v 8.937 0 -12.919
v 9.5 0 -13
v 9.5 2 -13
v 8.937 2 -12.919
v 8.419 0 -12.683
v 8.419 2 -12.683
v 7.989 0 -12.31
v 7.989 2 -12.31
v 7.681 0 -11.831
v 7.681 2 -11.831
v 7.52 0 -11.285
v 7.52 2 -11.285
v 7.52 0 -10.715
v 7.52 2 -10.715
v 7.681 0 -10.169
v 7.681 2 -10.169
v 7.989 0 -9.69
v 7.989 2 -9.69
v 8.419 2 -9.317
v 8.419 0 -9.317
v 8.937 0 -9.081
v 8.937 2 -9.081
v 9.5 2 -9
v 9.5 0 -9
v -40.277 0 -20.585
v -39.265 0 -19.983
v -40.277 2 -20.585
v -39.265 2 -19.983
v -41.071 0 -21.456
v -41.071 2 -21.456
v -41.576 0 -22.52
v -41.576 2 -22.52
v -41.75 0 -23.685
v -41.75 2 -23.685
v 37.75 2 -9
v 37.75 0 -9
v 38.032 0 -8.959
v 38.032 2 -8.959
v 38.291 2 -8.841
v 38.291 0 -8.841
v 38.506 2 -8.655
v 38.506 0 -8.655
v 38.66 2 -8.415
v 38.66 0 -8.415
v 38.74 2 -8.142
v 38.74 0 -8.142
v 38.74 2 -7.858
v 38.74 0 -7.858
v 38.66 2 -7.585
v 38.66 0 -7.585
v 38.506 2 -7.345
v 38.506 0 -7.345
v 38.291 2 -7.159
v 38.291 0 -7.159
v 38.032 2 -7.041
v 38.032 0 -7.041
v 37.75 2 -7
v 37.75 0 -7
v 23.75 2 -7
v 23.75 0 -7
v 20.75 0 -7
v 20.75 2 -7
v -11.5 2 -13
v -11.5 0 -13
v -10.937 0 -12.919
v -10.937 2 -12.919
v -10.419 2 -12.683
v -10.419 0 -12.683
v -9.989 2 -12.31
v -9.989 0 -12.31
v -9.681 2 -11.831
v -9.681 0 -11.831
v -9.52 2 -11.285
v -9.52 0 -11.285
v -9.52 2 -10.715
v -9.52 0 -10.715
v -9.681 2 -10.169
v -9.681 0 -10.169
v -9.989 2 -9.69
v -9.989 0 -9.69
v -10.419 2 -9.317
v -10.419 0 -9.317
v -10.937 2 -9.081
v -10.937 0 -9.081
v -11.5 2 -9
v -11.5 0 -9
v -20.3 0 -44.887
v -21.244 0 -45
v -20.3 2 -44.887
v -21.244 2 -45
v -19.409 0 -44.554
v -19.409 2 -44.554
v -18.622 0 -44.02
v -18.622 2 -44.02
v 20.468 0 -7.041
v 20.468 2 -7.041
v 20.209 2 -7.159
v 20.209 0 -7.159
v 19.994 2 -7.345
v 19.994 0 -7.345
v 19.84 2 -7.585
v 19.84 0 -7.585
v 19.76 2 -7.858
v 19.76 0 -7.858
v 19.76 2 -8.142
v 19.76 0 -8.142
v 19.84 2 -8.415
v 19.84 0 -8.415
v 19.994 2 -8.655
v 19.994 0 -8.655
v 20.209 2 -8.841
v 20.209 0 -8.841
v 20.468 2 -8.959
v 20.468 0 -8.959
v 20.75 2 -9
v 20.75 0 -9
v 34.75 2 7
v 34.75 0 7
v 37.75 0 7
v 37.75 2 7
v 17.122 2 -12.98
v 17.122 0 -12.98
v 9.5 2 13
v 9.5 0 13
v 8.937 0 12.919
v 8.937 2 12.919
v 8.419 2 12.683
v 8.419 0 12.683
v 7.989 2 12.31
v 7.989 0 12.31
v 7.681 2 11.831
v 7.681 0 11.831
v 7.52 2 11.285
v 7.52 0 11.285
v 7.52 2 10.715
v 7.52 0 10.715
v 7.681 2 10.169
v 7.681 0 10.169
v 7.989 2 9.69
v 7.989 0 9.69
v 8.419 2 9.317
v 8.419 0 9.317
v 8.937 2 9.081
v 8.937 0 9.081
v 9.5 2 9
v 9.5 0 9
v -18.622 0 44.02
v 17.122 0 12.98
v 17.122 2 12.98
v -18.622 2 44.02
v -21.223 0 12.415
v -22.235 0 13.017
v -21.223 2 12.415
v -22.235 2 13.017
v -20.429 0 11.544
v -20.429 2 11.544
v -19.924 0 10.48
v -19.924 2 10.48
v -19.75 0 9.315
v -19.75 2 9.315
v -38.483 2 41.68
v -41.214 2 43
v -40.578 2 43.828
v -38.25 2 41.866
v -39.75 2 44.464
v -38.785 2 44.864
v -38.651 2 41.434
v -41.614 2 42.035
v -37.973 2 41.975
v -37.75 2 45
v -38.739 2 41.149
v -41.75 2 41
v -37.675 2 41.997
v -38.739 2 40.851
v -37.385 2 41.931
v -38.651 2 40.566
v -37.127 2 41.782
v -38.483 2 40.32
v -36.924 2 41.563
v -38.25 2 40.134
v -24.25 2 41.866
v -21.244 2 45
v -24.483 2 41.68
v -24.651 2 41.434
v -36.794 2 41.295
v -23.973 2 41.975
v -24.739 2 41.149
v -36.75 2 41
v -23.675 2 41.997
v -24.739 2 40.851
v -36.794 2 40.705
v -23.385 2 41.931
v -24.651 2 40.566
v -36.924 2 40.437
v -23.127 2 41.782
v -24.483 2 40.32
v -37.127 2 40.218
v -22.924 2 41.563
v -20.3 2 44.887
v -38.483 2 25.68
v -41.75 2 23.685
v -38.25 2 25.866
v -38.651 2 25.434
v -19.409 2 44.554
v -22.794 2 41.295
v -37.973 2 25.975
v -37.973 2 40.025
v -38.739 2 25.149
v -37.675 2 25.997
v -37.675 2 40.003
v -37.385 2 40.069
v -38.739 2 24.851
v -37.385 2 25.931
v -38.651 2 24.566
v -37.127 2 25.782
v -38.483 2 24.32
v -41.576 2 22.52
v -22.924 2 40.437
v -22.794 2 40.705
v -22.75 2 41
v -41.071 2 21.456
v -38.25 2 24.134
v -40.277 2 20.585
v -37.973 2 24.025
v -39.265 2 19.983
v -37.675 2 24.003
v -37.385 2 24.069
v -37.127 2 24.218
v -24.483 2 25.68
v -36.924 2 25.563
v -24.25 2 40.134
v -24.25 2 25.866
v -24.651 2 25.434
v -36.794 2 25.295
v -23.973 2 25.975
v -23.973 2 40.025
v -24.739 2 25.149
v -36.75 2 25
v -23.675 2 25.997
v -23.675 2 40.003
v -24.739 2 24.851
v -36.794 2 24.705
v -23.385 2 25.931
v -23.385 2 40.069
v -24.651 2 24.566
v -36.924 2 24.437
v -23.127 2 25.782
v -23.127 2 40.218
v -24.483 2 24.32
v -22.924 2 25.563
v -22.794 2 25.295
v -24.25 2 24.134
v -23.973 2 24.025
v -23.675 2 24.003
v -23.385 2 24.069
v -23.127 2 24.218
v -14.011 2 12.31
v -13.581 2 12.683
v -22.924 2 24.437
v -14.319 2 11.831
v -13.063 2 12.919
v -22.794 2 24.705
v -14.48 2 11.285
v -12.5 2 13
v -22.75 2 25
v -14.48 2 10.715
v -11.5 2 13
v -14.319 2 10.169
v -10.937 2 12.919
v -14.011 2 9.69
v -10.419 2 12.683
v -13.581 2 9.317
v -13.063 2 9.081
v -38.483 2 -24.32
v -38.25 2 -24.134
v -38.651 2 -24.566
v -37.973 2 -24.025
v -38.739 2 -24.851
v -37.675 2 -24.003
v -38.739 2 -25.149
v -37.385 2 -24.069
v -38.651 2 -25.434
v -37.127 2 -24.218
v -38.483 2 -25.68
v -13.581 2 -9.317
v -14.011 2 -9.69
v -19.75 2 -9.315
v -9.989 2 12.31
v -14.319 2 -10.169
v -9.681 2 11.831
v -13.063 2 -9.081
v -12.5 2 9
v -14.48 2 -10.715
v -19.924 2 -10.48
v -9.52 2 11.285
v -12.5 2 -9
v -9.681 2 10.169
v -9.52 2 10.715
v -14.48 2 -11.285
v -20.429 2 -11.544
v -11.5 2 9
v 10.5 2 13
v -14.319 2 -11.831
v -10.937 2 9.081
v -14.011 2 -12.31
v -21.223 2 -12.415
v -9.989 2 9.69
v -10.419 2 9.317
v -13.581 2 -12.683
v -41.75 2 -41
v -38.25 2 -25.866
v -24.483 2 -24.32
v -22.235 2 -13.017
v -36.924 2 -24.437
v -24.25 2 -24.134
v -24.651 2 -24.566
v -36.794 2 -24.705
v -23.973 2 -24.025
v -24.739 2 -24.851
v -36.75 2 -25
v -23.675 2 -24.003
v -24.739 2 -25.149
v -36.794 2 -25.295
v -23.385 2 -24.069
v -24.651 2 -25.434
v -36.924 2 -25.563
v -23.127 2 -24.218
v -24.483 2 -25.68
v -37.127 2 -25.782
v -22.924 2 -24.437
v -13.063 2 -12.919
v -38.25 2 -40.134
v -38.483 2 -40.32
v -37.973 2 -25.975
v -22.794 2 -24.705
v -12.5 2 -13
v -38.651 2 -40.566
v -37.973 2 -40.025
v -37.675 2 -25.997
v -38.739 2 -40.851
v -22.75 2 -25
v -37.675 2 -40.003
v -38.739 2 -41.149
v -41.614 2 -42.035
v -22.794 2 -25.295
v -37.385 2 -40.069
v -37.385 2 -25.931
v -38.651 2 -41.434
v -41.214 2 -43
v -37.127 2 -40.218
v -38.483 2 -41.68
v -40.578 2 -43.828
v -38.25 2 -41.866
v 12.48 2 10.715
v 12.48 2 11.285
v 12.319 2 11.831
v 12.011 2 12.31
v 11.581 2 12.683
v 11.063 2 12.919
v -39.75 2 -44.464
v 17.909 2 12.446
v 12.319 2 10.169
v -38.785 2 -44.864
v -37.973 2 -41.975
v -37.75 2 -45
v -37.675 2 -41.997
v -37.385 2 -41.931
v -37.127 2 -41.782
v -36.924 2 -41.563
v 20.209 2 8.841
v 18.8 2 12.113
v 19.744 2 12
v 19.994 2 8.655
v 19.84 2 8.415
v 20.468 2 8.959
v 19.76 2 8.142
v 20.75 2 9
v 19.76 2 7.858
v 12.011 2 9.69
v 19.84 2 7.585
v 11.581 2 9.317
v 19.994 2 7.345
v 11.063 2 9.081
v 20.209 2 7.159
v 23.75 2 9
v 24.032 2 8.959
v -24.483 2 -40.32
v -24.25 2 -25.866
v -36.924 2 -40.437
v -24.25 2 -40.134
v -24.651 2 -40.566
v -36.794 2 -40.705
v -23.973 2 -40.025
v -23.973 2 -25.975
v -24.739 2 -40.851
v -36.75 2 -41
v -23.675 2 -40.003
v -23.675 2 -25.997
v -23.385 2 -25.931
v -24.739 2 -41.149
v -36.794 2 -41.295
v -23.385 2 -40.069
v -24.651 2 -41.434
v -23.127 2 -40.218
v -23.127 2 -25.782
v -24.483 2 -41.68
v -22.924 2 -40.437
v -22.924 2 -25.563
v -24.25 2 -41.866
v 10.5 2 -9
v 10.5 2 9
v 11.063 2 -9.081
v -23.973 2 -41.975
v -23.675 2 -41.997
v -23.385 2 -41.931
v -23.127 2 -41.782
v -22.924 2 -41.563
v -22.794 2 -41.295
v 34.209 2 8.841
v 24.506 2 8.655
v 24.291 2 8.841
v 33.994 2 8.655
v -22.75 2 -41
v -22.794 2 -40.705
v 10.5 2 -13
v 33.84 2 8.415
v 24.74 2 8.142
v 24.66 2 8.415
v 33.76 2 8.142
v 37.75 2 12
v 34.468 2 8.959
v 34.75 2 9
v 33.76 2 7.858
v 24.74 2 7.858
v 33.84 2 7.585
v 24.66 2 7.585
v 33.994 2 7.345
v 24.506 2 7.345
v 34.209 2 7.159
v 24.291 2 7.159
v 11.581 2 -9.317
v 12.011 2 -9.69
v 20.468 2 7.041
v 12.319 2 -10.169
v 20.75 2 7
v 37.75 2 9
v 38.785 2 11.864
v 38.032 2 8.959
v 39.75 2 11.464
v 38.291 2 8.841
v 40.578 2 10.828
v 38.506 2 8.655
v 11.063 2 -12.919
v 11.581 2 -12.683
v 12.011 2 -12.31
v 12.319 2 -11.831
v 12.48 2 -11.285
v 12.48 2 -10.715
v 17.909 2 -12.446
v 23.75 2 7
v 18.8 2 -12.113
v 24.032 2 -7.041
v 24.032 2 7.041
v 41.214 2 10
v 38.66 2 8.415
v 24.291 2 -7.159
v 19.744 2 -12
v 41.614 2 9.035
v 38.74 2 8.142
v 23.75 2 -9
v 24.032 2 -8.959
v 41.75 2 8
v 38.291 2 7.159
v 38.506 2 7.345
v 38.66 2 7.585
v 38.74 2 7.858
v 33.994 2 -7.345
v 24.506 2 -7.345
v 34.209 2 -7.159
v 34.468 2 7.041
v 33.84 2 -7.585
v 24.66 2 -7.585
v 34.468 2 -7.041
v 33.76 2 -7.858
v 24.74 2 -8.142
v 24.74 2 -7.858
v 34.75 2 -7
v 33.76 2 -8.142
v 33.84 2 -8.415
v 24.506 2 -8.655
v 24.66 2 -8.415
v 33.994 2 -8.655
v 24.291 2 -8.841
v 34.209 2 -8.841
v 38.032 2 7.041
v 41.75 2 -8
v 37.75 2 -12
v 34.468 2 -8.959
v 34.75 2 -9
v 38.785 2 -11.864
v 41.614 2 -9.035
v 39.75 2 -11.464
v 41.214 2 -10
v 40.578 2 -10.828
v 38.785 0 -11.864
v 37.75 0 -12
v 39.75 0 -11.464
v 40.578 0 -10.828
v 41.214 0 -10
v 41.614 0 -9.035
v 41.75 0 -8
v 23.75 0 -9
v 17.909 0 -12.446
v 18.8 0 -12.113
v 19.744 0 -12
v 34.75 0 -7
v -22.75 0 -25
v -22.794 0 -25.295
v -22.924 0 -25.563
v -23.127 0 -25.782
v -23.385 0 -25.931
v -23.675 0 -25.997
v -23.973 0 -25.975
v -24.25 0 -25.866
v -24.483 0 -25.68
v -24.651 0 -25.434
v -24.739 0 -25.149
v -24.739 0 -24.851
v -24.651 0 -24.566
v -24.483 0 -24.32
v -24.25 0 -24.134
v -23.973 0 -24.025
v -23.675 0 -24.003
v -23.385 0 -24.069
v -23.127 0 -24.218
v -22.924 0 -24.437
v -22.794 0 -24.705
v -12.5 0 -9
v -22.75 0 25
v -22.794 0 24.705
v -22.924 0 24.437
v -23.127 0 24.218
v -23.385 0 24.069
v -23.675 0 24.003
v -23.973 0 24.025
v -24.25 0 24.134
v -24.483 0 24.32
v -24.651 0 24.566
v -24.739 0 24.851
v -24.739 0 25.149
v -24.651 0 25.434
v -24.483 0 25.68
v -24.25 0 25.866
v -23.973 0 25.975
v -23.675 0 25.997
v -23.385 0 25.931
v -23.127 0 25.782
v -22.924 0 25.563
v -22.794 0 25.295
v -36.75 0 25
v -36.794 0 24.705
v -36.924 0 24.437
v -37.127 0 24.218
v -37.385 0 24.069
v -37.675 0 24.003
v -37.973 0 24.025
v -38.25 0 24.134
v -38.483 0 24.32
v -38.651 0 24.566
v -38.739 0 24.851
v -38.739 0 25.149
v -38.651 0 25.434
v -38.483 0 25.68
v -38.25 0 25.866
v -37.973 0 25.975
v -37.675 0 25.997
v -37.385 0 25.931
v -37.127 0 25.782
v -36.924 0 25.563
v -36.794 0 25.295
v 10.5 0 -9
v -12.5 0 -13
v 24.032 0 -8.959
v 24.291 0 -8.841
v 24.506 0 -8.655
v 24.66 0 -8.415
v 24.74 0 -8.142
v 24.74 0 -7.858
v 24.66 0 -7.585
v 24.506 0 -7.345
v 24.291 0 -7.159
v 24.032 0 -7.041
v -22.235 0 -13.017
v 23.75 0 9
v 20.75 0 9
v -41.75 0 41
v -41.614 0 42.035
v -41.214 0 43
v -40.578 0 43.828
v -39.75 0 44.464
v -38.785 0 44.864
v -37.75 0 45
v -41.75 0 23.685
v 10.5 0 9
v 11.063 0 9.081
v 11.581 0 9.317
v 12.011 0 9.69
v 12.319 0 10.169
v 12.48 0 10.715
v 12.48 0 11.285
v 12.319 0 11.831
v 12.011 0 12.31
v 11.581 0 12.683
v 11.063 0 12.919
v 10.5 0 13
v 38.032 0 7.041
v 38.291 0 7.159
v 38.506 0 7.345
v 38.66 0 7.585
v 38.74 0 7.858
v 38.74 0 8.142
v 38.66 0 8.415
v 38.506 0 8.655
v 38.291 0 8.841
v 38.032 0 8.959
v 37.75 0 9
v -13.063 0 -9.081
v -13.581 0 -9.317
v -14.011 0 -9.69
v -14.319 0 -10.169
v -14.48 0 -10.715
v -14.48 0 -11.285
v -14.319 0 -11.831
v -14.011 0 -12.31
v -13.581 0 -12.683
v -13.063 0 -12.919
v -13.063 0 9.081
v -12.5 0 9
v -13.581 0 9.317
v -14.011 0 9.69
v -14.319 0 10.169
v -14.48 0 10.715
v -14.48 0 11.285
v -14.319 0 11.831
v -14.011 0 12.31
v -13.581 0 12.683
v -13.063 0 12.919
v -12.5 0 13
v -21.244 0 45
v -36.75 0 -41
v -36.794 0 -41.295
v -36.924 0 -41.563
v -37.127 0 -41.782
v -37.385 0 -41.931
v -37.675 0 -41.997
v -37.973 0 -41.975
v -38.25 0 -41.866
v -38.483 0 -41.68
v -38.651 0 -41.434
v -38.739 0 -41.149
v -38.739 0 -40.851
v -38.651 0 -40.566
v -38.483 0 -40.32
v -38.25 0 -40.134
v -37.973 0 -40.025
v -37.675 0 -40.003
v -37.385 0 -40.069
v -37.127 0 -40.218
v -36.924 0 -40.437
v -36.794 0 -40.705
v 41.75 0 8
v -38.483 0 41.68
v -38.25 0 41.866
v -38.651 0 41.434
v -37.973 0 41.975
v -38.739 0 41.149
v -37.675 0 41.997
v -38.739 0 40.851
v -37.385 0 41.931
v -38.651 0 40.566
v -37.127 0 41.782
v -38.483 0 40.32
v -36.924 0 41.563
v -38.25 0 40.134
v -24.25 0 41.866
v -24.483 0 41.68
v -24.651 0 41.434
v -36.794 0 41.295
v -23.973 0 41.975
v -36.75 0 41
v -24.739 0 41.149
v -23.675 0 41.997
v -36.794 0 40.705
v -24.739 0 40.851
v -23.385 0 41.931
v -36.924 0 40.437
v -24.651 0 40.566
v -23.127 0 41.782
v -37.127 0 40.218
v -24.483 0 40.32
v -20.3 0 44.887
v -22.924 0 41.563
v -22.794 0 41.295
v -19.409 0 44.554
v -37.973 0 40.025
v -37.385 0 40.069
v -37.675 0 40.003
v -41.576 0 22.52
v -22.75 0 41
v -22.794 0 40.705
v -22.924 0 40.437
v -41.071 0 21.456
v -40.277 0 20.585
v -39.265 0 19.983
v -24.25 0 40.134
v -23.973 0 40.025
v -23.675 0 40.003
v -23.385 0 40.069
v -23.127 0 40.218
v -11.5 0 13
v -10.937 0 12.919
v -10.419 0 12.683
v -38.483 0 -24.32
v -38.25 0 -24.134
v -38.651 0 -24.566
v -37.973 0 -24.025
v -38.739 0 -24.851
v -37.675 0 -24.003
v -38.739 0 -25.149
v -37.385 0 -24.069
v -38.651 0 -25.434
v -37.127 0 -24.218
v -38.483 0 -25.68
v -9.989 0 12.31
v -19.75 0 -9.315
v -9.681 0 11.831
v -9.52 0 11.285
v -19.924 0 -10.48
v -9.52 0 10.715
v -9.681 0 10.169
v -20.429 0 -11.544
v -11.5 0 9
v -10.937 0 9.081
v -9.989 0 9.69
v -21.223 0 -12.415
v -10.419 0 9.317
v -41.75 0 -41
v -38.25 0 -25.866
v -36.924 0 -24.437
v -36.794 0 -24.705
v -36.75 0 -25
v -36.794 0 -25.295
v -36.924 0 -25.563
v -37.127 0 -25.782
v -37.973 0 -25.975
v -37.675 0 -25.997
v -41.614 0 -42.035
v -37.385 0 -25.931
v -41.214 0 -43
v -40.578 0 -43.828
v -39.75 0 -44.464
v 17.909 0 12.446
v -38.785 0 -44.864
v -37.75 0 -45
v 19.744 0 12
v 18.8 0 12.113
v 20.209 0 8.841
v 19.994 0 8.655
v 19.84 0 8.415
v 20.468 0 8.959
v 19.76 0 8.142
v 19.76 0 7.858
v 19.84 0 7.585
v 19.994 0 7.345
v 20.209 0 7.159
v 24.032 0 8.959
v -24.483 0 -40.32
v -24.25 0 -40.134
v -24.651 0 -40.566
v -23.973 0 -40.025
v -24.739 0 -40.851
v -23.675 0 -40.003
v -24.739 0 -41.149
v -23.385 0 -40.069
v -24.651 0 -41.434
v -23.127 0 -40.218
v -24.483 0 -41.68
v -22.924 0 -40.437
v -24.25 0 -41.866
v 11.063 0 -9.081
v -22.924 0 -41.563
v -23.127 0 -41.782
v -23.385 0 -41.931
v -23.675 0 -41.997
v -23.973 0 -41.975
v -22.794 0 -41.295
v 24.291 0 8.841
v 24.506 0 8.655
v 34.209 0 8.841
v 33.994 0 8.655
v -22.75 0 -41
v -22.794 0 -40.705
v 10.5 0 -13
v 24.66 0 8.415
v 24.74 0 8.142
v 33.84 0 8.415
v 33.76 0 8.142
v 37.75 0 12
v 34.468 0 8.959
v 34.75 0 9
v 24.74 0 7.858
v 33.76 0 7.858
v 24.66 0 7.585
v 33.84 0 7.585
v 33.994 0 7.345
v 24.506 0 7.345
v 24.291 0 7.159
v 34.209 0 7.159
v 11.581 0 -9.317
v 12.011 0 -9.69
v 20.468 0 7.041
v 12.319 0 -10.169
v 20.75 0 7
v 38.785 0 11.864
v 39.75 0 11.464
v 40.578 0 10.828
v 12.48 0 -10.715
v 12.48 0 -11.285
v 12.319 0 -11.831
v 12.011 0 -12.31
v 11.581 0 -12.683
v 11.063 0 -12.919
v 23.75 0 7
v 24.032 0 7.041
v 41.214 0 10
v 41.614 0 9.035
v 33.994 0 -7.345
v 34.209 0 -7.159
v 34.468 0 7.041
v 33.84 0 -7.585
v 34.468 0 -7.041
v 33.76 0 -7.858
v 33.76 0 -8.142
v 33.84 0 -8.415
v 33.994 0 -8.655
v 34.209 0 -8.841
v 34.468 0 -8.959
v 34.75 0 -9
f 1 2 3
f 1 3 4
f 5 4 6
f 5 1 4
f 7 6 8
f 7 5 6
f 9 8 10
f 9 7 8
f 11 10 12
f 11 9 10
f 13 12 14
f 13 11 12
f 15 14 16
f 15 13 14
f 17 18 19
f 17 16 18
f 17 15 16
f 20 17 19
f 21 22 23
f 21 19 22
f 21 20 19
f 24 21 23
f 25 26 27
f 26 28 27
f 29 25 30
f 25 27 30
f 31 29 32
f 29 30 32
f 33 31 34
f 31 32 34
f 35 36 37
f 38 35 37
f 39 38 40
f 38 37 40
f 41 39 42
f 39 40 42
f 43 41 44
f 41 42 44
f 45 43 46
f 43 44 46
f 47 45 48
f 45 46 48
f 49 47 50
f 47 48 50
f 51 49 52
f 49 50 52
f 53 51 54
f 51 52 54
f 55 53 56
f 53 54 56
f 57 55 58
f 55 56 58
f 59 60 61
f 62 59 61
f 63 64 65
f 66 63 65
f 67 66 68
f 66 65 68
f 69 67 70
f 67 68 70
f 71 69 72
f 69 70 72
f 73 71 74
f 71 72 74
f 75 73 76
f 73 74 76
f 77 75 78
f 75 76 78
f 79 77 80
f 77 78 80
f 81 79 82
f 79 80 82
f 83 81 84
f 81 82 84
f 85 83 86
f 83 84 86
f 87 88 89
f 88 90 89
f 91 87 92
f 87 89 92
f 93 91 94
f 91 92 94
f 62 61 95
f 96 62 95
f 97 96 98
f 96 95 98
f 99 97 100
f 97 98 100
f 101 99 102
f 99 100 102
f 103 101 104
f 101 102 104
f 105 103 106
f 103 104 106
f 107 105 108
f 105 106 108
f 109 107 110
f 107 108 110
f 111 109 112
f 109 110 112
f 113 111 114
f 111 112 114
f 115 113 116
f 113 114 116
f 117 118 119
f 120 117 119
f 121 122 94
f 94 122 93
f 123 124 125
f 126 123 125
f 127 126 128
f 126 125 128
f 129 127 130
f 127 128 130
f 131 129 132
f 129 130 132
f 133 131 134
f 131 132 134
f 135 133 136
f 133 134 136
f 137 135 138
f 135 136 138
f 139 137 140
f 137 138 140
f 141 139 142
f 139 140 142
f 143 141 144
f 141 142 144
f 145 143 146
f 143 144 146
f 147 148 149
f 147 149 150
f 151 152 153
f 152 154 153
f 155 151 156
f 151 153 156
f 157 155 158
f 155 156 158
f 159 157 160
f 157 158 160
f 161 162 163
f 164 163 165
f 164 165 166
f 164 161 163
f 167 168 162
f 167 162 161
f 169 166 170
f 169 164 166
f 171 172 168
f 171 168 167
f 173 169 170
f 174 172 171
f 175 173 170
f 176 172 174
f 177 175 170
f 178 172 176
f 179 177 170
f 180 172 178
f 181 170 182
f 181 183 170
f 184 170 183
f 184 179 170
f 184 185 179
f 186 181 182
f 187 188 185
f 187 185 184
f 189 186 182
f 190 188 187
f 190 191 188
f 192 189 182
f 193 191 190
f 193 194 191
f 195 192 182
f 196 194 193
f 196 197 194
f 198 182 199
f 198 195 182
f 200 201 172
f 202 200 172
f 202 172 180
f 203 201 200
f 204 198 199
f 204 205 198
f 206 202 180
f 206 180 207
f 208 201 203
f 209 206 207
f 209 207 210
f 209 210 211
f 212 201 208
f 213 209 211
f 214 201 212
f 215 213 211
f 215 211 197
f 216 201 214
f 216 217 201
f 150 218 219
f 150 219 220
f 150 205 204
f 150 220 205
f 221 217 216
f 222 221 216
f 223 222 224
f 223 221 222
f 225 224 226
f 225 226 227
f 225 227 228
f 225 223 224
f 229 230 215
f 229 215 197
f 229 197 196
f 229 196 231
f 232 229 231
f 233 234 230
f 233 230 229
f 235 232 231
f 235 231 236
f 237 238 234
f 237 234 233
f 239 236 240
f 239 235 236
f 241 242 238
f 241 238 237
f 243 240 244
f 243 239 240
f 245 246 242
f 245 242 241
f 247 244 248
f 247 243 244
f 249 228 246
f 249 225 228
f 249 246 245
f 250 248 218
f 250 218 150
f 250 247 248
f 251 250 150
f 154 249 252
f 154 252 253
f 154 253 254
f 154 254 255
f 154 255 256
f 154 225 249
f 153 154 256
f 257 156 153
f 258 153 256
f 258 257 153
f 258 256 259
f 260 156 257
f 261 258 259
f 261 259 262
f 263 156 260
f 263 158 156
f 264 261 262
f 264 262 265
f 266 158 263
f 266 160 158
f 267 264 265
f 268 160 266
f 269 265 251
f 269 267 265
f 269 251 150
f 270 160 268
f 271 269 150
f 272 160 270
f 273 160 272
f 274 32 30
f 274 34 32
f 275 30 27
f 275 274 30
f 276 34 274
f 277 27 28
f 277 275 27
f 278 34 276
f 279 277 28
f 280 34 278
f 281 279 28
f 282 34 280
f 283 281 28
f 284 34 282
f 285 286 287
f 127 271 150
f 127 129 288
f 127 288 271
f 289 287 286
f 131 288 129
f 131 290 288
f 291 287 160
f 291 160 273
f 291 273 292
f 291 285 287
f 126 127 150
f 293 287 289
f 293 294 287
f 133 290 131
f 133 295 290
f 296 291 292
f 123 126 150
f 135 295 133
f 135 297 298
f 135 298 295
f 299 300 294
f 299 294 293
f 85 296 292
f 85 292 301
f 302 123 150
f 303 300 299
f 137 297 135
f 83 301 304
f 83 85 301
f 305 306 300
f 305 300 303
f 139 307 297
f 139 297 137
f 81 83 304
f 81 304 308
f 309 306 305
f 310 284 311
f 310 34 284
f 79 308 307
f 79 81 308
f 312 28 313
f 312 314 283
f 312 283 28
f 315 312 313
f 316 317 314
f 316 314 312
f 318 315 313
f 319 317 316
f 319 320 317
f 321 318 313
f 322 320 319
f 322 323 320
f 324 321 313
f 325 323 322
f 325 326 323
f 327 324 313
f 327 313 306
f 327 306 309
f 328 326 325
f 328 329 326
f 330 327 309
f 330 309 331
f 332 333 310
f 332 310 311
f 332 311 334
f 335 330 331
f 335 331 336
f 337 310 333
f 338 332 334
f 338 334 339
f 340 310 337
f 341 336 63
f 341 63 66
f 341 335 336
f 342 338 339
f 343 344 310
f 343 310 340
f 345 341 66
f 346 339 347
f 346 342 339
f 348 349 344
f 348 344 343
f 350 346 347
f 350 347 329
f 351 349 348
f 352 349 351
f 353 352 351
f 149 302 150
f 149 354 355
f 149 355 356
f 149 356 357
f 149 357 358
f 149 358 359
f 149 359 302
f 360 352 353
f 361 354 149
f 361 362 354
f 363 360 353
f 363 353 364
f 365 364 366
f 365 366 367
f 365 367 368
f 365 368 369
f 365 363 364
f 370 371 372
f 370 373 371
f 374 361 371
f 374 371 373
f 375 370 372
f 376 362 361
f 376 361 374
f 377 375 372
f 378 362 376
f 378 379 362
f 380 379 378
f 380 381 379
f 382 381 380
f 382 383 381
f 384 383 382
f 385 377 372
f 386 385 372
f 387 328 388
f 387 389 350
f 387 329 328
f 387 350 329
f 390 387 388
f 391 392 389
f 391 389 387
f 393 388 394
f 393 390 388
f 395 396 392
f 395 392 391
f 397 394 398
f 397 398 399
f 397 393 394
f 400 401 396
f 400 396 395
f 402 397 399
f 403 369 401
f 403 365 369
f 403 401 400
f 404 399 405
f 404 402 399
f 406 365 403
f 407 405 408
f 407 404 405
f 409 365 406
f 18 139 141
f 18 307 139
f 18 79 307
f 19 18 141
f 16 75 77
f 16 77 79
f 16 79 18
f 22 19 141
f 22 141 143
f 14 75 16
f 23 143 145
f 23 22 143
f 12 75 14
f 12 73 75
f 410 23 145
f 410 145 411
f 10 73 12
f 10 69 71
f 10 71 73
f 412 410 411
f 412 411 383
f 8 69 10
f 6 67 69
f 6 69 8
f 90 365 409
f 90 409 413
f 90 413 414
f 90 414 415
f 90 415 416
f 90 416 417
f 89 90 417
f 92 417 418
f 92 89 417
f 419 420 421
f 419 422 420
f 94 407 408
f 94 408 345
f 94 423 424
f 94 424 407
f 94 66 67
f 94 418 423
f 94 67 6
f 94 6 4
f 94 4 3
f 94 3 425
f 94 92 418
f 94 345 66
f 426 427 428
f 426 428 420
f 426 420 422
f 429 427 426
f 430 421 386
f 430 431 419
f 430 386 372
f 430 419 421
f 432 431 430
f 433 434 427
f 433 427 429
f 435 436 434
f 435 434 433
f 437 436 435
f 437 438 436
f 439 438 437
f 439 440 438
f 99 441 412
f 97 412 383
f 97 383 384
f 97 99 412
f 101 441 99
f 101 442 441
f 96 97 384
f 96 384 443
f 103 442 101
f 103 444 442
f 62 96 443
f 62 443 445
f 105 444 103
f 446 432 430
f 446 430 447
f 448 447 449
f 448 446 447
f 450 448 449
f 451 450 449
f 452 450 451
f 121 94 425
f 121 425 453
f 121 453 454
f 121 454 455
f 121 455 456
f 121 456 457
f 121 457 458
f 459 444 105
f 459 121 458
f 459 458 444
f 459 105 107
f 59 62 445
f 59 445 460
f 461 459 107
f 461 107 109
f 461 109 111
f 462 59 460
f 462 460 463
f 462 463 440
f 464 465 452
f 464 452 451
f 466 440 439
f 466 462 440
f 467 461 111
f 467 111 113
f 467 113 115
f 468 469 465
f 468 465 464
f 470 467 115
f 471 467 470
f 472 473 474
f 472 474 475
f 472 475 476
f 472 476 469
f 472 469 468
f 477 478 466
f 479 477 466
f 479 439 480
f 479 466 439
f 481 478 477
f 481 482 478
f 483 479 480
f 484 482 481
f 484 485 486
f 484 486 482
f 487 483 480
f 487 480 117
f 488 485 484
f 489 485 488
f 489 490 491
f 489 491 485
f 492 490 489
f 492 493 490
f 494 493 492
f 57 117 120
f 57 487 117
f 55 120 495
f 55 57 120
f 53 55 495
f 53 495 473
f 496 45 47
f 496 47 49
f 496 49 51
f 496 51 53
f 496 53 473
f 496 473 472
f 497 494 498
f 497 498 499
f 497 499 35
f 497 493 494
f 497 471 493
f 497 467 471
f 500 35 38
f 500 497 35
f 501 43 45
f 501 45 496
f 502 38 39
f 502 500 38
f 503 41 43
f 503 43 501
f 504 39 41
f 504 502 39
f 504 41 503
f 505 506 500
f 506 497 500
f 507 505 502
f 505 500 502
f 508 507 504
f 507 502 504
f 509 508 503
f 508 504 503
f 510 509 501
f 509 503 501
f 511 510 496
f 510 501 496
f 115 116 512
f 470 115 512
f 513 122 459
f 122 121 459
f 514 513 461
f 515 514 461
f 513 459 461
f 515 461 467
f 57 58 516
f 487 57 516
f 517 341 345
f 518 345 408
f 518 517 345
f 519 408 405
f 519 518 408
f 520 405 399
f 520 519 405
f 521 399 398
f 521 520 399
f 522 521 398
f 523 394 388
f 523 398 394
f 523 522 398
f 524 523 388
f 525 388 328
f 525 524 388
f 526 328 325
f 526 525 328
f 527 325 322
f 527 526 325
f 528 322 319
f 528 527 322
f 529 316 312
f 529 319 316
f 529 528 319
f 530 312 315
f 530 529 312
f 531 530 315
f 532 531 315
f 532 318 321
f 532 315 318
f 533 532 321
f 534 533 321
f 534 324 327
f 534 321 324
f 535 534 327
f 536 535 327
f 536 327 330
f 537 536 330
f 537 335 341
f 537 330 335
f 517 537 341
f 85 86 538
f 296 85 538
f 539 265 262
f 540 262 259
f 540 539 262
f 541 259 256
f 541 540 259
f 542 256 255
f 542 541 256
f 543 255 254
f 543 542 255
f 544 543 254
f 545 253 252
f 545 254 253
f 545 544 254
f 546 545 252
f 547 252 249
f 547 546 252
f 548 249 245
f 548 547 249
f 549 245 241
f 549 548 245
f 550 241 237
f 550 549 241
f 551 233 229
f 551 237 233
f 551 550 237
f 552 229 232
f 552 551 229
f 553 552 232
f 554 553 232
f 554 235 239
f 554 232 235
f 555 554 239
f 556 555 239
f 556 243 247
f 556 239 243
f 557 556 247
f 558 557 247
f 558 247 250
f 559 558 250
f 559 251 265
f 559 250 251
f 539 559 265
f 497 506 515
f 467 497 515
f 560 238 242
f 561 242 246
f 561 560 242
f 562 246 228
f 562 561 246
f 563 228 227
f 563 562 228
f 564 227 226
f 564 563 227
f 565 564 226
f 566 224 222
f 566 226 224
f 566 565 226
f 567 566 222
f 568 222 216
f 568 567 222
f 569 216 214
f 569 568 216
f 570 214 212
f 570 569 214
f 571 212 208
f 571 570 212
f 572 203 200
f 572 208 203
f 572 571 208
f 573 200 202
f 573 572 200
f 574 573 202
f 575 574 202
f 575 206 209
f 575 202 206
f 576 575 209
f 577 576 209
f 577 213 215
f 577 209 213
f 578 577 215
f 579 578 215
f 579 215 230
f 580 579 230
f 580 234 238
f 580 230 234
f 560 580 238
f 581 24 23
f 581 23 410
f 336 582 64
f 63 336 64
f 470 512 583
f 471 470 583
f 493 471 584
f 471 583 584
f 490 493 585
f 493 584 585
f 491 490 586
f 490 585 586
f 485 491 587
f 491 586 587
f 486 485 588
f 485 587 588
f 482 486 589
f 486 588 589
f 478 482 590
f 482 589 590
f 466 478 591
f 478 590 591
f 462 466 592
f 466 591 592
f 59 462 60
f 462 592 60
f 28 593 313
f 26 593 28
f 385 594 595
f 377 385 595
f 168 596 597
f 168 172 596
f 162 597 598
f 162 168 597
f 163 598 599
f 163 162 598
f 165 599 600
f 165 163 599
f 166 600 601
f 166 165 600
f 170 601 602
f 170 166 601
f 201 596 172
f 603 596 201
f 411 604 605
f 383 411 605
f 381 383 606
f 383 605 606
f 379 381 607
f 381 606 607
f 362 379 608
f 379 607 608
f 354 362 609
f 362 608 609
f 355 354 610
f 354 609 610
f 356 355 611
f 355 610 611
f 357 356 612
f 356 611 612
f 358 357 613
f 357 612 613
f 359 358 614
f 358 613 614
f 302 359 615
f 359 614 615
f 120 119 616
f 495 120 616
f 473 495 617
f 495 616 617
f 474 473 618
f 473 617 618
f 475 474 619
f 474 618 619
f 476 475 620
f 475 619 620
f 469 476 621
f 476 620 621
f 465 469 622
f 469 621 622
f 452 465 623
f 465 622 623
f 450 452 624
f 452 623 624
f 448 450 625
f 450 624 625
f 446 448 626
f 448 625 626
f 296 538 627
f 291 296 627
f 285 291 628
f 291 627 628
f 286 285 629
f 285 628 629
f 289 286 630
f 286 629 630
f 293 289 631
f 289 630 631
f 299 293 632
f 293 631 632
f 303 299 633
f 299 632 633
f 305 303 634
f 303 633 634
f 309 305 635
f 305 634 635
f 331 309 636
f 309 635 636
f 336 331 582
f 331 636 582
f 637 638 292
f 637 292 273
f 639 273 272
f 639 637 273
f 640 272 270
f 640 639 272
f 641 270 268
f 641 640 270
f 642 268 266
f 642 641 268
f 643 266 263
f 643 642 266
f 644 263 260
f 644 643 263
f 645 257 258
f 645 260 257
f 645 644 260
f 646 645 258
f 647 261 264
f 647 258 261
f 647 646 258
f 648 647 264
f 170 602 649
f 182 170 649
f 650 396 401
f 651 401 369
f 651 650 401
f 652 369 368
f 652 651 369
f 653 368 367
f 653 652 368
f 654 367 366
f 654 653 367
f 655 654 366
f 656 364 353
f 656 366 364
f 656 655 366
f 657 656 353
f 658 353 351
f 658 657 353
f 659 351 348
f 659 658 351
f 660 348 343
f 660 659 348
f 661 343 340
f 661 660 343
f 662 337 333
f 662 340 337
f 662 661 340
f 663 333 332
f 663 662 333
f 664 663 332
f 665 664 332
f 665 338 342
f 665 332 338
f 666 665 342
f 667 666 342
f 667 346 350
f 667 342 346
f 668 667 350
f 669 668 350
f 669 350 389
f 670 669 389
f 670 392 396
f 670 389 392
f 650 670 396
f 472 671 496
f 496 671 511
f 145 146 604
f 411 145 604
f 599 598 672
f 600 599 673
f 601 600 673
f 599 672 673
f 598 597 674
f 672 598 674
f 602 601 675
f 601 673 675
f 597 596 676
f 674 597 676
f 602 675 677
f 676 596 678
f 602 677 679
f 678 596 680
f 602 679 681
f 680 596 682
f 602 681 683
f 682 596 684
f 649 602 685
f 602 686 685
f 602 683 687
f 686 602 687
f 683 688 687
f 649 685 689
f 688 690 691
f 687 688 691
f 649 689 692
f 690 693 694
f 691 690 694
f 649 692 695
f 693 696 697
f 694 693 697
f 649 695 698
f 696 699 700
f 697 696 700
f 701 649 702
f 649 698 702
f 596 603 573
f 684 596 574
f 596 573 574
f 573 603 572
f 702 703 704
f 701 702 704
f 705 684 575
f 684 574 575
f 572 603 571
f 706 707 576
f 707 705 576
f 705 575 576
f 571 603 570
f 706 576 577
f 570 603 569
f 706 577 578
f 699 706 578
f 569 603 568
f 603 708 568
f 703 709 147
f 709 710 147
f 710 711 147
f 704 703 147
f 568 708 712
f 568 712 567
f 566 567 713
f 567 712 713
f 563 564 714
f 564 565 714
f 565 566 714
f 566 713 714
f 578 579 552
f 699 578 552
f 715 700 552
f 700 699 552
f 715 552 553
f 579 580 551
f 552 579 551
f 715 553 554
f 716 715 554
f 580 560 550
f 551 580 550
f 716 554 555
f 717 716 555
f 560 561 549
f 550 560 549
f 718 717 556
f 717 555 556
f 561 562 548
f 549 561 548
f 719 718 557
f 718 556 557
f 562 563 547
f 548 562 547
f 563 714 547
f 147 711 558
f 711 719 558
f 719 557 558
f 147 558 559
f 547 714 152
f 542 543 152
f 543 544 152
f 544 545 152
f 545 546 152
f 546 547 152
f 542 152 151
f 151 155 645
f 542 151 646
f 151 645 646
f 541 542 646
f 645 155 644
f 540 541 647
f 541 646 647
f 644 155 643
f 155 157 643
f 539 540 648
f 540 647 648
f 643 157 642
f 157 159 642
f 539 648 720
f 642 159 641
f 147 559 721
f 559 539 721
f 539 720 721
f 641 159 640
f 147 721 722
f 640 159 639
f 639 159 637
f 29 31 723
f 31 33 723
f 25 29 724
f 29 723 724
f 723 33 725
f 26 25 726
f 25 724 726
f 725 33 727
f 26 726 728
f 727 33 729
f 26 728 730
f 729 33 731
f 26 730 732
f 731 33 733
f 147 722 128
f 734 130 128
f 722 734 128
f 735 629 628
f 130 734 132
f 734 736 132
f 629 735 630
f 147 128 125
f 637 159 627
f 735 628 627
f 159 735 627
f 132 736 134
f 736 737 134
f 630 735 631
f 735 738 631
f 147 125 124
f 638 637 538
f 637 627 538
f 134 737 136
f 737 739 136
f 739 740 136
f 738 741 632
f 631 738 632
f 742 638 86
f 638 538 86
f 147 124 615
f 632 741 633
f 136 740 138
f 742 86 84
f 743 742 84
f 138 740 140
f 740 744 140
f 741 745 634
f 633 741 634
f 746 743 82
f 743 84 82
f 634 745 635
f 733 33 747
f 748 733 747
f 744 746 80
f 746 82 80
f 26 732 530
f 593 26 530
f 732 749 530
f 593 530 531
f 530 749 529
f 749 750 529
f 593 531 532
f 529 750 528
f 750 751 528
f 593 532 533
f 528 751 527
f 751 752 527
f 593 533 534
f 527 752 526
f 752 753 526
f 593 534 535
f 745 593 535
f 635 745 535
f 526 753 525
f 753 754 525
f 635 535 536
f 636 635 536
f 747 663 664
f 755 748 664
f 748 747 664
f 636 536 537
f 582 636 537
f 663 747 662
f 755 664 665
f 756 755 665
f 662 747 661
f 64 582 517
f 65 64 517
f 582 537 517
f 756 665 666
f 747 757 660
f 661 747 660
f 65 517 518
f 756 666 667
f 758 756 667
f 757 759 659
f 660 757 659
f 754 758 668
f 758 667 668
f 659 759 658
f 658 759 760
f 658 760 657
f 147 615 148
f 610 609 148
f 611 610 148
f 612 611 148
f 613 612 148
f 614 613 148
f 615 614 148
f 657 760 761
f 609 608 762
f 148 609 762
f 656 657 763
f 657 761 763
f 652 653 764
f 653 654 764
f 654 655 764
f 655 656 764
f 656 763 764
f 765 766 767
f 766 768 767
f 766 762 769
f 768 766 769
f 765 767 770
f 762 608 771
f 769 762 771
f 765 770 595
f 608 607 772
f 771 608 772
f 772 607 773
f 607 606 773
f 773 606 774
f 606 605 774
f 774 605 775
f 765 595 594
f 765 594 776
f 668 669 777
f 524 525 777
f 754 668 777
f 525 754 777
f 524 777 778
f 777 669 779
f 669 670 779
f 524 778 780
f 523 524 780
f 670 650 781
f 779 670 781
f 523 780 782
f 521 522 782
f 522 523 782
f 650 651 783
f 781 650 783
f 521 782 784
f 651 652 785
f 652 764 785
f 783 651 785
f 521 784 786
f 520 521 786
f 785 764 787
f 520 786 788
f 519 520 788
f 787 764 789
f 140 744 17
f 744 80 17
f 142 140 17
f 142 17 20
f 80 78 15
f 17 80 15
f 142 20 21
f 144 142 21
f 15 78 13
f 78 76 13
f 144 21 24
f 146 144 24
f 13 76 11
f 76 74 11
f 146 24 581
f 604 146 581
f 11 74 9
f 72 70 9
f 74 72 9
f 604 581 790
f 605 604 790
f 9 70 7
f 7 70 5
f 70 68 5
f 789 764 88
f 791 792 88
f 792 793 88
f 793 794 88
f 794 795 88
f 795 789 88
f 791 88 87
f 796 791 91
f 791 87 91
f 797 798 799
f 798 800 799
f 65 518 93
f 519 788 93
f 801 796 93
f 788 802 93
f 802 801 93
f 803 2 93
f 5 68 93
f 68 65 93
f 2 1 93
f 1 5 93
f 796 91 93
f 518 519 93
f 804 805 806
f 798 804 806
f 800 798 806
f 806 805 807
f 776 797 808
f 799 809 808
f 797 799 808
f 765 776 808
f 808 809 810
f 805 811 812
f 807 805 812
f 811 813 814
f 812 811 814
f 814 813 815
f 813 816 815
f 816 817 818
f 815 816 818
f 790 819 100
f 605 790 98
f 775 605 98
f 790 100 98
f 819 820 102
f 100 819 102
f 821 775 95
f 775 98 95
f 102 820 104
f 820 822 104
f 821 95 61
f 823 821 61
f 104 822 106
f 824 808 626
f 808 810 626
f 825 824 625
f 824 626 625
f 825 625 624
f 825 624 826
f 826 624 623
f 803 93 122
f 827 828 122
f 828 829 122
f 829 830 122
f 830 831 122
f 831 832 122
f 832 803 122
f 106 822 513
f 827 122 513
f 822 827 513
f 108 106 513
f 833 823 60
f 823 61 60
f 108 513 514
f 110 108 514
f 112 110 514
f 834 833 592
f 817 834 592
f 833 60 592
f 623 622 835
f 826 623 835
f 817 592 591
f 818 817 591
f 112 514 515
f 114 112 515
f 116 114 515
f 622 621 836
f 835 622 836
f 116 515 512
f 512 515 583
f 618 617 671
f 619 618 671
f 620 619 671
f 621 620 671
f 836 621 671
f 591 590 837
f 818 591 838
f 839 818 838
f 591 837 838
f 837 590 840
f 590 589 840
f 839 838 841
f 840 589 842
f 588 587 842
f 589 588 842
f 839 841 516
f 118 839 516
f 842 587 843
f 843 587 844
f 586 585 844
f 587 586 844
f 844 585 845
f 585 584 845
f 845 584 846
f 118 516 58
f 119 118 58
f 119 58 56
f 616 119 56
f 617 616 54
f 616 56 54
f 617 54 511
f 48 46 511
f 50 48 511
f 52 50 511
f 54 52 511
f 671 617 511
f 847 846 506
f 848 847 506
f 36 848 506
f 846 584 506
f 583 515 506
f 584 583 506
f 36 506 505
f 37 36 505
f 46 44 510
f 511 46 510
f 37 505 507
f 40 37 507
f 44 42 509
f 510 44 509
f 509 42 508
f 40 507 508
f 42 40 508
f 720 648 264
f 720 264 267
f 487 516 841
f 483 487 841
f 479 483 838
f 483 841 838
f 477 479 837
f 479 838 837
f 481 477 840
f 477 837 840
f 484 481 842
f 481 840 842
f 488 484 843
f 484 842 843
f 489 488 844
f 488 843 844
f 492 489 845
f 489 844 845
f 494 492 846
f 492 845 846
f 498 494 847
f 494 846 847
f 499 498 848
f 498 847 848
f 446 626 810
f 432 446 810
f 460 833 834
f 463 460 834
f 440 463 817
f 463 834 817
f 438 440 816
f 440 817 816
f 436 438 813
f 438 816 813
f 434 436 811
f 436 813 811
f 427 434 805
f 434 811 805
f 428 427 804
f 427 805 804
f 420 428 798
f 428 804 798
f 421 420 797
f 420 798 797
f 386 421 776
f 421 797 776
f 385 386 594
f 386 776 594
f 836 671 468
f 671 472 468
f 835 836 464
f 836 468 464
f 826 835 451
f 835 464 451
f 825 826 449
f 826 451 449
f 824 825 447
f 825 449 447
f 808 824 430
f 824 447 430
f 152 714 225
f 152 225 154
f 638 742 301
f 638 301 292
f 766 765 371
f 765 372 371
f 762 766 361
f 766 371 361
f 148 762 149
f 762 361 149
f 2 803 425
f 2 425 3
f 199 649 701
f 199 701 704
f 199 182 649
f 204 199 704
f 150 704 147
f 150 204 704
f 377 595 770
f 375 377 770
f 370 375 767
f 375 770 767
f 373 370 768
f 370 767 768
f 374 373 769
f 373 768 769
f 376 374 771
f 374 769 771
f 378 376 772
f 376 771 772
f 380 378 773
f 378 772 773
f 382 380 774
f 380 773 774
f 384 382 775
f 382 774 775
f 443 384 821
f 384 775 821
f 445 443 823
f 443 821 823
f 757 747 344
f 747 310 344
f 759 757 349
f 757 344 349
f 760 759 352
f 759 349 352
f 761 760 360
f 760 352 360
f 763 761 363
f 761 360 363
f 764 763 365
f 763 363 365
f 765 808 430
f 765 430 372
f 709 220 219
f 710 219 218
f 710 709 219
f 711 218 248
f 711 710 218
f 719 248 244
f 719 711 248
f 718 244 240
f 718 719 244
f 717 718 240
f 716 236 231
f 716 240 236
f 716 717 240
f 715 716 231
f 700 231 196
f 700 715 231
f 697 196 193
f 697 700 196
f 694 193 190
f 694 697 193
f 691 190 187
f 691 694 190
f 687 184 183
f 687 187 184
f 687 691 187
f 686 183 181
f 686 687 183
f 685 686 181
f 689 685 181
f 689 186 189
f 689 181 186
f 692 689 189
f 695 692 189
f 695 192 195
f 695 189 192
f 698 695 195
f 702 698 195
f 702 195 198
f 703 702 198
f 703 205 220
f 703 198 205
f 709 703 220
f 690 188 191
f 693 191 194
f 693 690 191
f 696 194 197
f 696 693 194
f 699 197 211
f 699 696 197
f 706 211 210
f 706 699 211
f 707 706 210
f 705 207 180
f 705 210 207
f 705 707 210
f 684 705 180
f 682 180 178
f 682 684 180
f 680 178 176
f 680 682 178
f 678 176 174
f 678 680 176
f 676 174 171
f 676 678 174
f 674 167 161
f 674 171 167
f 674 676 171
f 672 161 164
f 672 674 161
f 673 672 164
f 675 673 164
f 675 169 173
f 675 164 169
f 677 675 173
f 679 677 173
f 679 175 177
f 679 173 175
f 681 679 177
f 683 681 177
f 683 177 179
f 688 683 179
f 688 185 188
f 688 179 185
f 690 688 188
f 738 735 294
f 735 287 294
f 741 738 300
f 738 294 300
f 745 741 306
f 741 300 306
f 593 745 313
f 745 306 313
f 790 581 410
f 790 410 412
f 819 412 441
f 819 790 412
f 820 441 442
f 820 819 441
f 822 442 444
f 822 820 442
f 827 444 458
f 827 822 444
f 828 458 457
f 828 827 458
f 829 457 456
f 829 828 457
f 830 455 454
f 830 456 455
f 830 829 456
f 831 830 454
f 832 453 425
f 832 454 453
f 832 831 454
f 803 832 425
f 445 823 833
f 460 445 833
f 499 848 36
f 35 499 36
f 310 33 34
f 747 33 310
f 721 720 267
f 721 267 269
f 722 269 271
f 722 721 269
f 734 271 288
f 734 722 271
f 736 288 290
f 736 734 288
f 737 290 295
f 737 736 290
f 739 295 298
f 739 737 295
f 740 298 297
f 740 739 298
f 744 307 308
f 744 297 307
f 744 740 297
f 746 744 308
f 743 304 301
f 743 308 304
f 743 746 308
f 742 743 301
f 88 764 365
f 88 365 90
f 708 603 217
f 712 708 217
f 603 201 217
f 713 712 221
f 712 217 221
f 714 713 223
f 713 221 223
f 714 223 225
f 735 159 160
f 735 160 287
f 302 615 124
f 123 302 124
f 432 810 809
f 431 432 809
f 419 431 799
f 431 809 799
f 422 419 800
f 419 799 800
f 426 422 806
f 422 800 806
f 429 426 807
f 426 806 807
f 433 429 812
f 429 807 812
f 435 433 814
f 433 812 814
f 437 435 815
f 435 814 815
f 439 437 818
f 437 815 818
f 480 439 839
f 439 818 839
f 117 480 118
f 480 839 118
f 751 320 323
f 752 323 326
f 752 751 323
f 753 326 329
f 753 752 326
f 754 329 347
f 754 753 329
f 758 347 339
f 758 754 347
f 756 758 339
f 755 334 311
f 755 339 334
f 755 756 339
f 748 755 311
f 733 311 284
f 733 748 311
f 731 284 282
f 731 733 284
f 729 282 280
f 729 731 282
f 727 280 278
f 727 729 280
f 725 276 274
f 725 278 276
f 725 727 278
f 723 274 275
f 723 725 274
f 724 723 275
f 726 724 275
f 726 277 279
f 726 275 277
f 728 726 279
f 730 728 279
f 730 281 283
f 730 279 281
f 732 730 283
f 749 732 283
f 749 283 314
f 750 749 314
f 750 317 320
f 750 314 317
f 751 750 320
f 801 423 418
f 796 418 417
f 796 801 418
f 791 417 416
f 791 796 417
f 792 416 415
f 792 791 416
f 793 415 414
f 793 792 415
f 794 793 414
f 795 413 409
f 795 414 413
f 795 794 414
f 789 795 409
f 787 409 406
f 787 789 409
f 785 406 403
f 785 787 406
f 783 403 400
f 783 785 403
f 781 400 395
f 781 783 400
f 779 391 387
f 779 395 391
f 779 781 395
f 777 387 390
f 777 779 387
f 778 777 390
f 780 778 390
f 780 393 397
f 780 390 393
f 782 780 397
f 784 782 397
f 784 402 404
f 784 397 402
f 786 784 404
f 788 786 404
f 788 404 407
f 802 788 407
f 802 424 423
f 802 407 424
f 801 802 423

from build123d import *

# Parameters (mm, degrees)
ESQUISSE1_W             = 83.5
ESQUISSE1_H             = 90
BOSS_EXTRU_1_DEPTH      = 2
ESQUISSE2_R             = 1
ENL_V_MAT_EXTRU_1_DEPTH = 3
CONG_1_R                = 4
ENL_V_MAT_EXTRU_2_DEPTH = 3


with BuildPart() as part:
    # Esquisse1 → Boss.-Extru.1 (new body)
    with BuildSketch(Plane(origin=(0, 0, 0), x_dir=(1, 0, 0), z_dir=(0, 1, 0))):
        Rectangle(ESQUISSE1_W, ESQUISSE1_H)
    extrude(amount=BOSS_EXTRU_1_DEPTH)

    # Esquisse2 → Enlèv. mat.-Extru.1 (cut, through all)
    with BuildSketch(Plane(origin=(0, 0, 0), x_dir=(1, 0, 0), z_dir=(0, 1, 0))):
        with Locations((-23.75, -25)):
            Circle(ESQUISSE2_R)
        with Locations((-37.75, -25)):
            Circle(ESQUISSE2_R)
        with Locations((-37.75, -41)):
            Circle(ESQUISSE2_R)
        with Locations((-23.75, -41)):
            Circle(ESQUISSE2_R)
        with Locations((-23.75, 41)):
            Circle(ESQUISSE2_R)
        with Locations((-37.75, 41)):
            Circle(ESQUISSE2_R)
        with Locations((-37.75, 25)):
            Circle(ESQUISSE2_R)
        with Locations((-23.75, 25)):
            Circle(ESQUISSE2_R)
        Polygon((41.75, 12), (18.25, 12), (-19.75, 45), (41.75, 45), align=None)
        Polygon((41.75, -12), (18.25, -12), (-19.75, -45), (41.75, -45), align=None)
        Polygon((-41.75, -21), (-19.75, -12), (-19.75, 12), (-41.75, 21), align=None)
        with BuildLine():
            Line((20.75, 9), (23.75, 9))
            ThreePointArc((23.75, 9), (24.75, 8), (23.75, 7))
            Line((23.75, 7), (20.75, 7))
            ThreePointArc((20.75, 7), (19.75, 8), (20.75, 9))
        make_face()
        with BuildLine():
            Line((37.75, 7), (34.75, 7))
            ThreePointArc((34.75, 7), (33.75, 8), (34.75, 9))
            Line((34.75, 9), (37.75, 9))
            ThreePointArc((37.75, 9), (38.75, 8), (37.75, 7))
        make_face()
        with BuildLine():
            Line((20.75, -7), (23.75, -7))
            ThreePointArc((23.75, -7), (24.75, -8), (23.75, -9))
            Line((23.75, -9), (20.75, -9))
            ThreePointArc((20.75, -9), (19.75, -8), (20.75, -7))
        make_face()
        with BuildLine():
            Line((37.75, -9), (34.75, -9))
            ThreePointArc((34.75, -9), (33.75, -8), (34.75, -7))
            Line((34.75, -7), (37.75, -7))
            ThreePointArc((37.75, -7), (38.75, -8), (37.75, -9))
        make_face()
    extrude(amount=ENL_V_MAT_EXTRU_1_DEPTH, mode=Mode.SUBTRACT)

    # Congé1
    cong_1_edges = [part.edges().sort_by_distance(p)[0] for p in [
        (-19.75, 1, -12),
        (-41.75, 1, -45),
        (-41.75, 1, 45),
        (41.75, 1, 12),
        (18.25, 1, 12),
        (-19.75, 1, 45),
        (41.75, 1, -12),
        (-19.75, 1, -45),
        (18.25, 1, -12),
        (-41.75, 1, -21),
        (-41.75, 1, 21),
        (-19.75, 1, 12),
    ]]
    fillet(cong_1_edges, radius=CONG_1_R)

    # Esquisse3 → Enlèv. mat.-Extru.2 (cut, through all)
    with BuildSketch(Plane(origin=(0, 0, 0), x_dir=(1, 0, 0), z_dir=(0, 1, 0))):
        with BuildLine():
            Line((-12.5, 13), (-11.5, 13))
            ThreePointArc((-11.5, 13), (-9.5, 11), (-11.5, 9))
            Line((-11.5, 9), (-12.5, 9))
            ThreePointArc((-12.5, 9), (-14.5, 11), (-12.5, 13))
        make_face()
        with BuildLine():
            Line((10.5, 13), (9.5, 13))
            ThreePointArc((9.5, 13), (7.5, 11), (9.5, 9))
            Line((9.5, 9), (10.5, 9))
            ThreePointArc((10.5, 9), (12.5, 11), (10.5, 13))
        make_face()
        with BuildLine():
            Line((10.5, -13), (9.5, -13))
            ThreePointArc((9.5, -13), (7.5, -11), (9.5, -9))
            Line((9.5, -9), (10.5, -9))
            ThreePointArc((10.5, -9), (12.5, -11), (10.5, -13))
        make_face()
        with BuildLine():
            Line((-12.5, -13), (-11.5, -13))
            ThreePointArc((-11.5, -13), (-9.5, -11), (-11.5, -9))
            Line((-11.5, -9), (-12.5, -9))
            ThreePointArc((-12.5, -9), (-14.5, -11), (-12.5, -13))
        make_face()
    extrude(amount=ENL_V_MAT_EXTRU_2_DEPTH, mode=Mode.SUBTRACT)


solid = part.part
